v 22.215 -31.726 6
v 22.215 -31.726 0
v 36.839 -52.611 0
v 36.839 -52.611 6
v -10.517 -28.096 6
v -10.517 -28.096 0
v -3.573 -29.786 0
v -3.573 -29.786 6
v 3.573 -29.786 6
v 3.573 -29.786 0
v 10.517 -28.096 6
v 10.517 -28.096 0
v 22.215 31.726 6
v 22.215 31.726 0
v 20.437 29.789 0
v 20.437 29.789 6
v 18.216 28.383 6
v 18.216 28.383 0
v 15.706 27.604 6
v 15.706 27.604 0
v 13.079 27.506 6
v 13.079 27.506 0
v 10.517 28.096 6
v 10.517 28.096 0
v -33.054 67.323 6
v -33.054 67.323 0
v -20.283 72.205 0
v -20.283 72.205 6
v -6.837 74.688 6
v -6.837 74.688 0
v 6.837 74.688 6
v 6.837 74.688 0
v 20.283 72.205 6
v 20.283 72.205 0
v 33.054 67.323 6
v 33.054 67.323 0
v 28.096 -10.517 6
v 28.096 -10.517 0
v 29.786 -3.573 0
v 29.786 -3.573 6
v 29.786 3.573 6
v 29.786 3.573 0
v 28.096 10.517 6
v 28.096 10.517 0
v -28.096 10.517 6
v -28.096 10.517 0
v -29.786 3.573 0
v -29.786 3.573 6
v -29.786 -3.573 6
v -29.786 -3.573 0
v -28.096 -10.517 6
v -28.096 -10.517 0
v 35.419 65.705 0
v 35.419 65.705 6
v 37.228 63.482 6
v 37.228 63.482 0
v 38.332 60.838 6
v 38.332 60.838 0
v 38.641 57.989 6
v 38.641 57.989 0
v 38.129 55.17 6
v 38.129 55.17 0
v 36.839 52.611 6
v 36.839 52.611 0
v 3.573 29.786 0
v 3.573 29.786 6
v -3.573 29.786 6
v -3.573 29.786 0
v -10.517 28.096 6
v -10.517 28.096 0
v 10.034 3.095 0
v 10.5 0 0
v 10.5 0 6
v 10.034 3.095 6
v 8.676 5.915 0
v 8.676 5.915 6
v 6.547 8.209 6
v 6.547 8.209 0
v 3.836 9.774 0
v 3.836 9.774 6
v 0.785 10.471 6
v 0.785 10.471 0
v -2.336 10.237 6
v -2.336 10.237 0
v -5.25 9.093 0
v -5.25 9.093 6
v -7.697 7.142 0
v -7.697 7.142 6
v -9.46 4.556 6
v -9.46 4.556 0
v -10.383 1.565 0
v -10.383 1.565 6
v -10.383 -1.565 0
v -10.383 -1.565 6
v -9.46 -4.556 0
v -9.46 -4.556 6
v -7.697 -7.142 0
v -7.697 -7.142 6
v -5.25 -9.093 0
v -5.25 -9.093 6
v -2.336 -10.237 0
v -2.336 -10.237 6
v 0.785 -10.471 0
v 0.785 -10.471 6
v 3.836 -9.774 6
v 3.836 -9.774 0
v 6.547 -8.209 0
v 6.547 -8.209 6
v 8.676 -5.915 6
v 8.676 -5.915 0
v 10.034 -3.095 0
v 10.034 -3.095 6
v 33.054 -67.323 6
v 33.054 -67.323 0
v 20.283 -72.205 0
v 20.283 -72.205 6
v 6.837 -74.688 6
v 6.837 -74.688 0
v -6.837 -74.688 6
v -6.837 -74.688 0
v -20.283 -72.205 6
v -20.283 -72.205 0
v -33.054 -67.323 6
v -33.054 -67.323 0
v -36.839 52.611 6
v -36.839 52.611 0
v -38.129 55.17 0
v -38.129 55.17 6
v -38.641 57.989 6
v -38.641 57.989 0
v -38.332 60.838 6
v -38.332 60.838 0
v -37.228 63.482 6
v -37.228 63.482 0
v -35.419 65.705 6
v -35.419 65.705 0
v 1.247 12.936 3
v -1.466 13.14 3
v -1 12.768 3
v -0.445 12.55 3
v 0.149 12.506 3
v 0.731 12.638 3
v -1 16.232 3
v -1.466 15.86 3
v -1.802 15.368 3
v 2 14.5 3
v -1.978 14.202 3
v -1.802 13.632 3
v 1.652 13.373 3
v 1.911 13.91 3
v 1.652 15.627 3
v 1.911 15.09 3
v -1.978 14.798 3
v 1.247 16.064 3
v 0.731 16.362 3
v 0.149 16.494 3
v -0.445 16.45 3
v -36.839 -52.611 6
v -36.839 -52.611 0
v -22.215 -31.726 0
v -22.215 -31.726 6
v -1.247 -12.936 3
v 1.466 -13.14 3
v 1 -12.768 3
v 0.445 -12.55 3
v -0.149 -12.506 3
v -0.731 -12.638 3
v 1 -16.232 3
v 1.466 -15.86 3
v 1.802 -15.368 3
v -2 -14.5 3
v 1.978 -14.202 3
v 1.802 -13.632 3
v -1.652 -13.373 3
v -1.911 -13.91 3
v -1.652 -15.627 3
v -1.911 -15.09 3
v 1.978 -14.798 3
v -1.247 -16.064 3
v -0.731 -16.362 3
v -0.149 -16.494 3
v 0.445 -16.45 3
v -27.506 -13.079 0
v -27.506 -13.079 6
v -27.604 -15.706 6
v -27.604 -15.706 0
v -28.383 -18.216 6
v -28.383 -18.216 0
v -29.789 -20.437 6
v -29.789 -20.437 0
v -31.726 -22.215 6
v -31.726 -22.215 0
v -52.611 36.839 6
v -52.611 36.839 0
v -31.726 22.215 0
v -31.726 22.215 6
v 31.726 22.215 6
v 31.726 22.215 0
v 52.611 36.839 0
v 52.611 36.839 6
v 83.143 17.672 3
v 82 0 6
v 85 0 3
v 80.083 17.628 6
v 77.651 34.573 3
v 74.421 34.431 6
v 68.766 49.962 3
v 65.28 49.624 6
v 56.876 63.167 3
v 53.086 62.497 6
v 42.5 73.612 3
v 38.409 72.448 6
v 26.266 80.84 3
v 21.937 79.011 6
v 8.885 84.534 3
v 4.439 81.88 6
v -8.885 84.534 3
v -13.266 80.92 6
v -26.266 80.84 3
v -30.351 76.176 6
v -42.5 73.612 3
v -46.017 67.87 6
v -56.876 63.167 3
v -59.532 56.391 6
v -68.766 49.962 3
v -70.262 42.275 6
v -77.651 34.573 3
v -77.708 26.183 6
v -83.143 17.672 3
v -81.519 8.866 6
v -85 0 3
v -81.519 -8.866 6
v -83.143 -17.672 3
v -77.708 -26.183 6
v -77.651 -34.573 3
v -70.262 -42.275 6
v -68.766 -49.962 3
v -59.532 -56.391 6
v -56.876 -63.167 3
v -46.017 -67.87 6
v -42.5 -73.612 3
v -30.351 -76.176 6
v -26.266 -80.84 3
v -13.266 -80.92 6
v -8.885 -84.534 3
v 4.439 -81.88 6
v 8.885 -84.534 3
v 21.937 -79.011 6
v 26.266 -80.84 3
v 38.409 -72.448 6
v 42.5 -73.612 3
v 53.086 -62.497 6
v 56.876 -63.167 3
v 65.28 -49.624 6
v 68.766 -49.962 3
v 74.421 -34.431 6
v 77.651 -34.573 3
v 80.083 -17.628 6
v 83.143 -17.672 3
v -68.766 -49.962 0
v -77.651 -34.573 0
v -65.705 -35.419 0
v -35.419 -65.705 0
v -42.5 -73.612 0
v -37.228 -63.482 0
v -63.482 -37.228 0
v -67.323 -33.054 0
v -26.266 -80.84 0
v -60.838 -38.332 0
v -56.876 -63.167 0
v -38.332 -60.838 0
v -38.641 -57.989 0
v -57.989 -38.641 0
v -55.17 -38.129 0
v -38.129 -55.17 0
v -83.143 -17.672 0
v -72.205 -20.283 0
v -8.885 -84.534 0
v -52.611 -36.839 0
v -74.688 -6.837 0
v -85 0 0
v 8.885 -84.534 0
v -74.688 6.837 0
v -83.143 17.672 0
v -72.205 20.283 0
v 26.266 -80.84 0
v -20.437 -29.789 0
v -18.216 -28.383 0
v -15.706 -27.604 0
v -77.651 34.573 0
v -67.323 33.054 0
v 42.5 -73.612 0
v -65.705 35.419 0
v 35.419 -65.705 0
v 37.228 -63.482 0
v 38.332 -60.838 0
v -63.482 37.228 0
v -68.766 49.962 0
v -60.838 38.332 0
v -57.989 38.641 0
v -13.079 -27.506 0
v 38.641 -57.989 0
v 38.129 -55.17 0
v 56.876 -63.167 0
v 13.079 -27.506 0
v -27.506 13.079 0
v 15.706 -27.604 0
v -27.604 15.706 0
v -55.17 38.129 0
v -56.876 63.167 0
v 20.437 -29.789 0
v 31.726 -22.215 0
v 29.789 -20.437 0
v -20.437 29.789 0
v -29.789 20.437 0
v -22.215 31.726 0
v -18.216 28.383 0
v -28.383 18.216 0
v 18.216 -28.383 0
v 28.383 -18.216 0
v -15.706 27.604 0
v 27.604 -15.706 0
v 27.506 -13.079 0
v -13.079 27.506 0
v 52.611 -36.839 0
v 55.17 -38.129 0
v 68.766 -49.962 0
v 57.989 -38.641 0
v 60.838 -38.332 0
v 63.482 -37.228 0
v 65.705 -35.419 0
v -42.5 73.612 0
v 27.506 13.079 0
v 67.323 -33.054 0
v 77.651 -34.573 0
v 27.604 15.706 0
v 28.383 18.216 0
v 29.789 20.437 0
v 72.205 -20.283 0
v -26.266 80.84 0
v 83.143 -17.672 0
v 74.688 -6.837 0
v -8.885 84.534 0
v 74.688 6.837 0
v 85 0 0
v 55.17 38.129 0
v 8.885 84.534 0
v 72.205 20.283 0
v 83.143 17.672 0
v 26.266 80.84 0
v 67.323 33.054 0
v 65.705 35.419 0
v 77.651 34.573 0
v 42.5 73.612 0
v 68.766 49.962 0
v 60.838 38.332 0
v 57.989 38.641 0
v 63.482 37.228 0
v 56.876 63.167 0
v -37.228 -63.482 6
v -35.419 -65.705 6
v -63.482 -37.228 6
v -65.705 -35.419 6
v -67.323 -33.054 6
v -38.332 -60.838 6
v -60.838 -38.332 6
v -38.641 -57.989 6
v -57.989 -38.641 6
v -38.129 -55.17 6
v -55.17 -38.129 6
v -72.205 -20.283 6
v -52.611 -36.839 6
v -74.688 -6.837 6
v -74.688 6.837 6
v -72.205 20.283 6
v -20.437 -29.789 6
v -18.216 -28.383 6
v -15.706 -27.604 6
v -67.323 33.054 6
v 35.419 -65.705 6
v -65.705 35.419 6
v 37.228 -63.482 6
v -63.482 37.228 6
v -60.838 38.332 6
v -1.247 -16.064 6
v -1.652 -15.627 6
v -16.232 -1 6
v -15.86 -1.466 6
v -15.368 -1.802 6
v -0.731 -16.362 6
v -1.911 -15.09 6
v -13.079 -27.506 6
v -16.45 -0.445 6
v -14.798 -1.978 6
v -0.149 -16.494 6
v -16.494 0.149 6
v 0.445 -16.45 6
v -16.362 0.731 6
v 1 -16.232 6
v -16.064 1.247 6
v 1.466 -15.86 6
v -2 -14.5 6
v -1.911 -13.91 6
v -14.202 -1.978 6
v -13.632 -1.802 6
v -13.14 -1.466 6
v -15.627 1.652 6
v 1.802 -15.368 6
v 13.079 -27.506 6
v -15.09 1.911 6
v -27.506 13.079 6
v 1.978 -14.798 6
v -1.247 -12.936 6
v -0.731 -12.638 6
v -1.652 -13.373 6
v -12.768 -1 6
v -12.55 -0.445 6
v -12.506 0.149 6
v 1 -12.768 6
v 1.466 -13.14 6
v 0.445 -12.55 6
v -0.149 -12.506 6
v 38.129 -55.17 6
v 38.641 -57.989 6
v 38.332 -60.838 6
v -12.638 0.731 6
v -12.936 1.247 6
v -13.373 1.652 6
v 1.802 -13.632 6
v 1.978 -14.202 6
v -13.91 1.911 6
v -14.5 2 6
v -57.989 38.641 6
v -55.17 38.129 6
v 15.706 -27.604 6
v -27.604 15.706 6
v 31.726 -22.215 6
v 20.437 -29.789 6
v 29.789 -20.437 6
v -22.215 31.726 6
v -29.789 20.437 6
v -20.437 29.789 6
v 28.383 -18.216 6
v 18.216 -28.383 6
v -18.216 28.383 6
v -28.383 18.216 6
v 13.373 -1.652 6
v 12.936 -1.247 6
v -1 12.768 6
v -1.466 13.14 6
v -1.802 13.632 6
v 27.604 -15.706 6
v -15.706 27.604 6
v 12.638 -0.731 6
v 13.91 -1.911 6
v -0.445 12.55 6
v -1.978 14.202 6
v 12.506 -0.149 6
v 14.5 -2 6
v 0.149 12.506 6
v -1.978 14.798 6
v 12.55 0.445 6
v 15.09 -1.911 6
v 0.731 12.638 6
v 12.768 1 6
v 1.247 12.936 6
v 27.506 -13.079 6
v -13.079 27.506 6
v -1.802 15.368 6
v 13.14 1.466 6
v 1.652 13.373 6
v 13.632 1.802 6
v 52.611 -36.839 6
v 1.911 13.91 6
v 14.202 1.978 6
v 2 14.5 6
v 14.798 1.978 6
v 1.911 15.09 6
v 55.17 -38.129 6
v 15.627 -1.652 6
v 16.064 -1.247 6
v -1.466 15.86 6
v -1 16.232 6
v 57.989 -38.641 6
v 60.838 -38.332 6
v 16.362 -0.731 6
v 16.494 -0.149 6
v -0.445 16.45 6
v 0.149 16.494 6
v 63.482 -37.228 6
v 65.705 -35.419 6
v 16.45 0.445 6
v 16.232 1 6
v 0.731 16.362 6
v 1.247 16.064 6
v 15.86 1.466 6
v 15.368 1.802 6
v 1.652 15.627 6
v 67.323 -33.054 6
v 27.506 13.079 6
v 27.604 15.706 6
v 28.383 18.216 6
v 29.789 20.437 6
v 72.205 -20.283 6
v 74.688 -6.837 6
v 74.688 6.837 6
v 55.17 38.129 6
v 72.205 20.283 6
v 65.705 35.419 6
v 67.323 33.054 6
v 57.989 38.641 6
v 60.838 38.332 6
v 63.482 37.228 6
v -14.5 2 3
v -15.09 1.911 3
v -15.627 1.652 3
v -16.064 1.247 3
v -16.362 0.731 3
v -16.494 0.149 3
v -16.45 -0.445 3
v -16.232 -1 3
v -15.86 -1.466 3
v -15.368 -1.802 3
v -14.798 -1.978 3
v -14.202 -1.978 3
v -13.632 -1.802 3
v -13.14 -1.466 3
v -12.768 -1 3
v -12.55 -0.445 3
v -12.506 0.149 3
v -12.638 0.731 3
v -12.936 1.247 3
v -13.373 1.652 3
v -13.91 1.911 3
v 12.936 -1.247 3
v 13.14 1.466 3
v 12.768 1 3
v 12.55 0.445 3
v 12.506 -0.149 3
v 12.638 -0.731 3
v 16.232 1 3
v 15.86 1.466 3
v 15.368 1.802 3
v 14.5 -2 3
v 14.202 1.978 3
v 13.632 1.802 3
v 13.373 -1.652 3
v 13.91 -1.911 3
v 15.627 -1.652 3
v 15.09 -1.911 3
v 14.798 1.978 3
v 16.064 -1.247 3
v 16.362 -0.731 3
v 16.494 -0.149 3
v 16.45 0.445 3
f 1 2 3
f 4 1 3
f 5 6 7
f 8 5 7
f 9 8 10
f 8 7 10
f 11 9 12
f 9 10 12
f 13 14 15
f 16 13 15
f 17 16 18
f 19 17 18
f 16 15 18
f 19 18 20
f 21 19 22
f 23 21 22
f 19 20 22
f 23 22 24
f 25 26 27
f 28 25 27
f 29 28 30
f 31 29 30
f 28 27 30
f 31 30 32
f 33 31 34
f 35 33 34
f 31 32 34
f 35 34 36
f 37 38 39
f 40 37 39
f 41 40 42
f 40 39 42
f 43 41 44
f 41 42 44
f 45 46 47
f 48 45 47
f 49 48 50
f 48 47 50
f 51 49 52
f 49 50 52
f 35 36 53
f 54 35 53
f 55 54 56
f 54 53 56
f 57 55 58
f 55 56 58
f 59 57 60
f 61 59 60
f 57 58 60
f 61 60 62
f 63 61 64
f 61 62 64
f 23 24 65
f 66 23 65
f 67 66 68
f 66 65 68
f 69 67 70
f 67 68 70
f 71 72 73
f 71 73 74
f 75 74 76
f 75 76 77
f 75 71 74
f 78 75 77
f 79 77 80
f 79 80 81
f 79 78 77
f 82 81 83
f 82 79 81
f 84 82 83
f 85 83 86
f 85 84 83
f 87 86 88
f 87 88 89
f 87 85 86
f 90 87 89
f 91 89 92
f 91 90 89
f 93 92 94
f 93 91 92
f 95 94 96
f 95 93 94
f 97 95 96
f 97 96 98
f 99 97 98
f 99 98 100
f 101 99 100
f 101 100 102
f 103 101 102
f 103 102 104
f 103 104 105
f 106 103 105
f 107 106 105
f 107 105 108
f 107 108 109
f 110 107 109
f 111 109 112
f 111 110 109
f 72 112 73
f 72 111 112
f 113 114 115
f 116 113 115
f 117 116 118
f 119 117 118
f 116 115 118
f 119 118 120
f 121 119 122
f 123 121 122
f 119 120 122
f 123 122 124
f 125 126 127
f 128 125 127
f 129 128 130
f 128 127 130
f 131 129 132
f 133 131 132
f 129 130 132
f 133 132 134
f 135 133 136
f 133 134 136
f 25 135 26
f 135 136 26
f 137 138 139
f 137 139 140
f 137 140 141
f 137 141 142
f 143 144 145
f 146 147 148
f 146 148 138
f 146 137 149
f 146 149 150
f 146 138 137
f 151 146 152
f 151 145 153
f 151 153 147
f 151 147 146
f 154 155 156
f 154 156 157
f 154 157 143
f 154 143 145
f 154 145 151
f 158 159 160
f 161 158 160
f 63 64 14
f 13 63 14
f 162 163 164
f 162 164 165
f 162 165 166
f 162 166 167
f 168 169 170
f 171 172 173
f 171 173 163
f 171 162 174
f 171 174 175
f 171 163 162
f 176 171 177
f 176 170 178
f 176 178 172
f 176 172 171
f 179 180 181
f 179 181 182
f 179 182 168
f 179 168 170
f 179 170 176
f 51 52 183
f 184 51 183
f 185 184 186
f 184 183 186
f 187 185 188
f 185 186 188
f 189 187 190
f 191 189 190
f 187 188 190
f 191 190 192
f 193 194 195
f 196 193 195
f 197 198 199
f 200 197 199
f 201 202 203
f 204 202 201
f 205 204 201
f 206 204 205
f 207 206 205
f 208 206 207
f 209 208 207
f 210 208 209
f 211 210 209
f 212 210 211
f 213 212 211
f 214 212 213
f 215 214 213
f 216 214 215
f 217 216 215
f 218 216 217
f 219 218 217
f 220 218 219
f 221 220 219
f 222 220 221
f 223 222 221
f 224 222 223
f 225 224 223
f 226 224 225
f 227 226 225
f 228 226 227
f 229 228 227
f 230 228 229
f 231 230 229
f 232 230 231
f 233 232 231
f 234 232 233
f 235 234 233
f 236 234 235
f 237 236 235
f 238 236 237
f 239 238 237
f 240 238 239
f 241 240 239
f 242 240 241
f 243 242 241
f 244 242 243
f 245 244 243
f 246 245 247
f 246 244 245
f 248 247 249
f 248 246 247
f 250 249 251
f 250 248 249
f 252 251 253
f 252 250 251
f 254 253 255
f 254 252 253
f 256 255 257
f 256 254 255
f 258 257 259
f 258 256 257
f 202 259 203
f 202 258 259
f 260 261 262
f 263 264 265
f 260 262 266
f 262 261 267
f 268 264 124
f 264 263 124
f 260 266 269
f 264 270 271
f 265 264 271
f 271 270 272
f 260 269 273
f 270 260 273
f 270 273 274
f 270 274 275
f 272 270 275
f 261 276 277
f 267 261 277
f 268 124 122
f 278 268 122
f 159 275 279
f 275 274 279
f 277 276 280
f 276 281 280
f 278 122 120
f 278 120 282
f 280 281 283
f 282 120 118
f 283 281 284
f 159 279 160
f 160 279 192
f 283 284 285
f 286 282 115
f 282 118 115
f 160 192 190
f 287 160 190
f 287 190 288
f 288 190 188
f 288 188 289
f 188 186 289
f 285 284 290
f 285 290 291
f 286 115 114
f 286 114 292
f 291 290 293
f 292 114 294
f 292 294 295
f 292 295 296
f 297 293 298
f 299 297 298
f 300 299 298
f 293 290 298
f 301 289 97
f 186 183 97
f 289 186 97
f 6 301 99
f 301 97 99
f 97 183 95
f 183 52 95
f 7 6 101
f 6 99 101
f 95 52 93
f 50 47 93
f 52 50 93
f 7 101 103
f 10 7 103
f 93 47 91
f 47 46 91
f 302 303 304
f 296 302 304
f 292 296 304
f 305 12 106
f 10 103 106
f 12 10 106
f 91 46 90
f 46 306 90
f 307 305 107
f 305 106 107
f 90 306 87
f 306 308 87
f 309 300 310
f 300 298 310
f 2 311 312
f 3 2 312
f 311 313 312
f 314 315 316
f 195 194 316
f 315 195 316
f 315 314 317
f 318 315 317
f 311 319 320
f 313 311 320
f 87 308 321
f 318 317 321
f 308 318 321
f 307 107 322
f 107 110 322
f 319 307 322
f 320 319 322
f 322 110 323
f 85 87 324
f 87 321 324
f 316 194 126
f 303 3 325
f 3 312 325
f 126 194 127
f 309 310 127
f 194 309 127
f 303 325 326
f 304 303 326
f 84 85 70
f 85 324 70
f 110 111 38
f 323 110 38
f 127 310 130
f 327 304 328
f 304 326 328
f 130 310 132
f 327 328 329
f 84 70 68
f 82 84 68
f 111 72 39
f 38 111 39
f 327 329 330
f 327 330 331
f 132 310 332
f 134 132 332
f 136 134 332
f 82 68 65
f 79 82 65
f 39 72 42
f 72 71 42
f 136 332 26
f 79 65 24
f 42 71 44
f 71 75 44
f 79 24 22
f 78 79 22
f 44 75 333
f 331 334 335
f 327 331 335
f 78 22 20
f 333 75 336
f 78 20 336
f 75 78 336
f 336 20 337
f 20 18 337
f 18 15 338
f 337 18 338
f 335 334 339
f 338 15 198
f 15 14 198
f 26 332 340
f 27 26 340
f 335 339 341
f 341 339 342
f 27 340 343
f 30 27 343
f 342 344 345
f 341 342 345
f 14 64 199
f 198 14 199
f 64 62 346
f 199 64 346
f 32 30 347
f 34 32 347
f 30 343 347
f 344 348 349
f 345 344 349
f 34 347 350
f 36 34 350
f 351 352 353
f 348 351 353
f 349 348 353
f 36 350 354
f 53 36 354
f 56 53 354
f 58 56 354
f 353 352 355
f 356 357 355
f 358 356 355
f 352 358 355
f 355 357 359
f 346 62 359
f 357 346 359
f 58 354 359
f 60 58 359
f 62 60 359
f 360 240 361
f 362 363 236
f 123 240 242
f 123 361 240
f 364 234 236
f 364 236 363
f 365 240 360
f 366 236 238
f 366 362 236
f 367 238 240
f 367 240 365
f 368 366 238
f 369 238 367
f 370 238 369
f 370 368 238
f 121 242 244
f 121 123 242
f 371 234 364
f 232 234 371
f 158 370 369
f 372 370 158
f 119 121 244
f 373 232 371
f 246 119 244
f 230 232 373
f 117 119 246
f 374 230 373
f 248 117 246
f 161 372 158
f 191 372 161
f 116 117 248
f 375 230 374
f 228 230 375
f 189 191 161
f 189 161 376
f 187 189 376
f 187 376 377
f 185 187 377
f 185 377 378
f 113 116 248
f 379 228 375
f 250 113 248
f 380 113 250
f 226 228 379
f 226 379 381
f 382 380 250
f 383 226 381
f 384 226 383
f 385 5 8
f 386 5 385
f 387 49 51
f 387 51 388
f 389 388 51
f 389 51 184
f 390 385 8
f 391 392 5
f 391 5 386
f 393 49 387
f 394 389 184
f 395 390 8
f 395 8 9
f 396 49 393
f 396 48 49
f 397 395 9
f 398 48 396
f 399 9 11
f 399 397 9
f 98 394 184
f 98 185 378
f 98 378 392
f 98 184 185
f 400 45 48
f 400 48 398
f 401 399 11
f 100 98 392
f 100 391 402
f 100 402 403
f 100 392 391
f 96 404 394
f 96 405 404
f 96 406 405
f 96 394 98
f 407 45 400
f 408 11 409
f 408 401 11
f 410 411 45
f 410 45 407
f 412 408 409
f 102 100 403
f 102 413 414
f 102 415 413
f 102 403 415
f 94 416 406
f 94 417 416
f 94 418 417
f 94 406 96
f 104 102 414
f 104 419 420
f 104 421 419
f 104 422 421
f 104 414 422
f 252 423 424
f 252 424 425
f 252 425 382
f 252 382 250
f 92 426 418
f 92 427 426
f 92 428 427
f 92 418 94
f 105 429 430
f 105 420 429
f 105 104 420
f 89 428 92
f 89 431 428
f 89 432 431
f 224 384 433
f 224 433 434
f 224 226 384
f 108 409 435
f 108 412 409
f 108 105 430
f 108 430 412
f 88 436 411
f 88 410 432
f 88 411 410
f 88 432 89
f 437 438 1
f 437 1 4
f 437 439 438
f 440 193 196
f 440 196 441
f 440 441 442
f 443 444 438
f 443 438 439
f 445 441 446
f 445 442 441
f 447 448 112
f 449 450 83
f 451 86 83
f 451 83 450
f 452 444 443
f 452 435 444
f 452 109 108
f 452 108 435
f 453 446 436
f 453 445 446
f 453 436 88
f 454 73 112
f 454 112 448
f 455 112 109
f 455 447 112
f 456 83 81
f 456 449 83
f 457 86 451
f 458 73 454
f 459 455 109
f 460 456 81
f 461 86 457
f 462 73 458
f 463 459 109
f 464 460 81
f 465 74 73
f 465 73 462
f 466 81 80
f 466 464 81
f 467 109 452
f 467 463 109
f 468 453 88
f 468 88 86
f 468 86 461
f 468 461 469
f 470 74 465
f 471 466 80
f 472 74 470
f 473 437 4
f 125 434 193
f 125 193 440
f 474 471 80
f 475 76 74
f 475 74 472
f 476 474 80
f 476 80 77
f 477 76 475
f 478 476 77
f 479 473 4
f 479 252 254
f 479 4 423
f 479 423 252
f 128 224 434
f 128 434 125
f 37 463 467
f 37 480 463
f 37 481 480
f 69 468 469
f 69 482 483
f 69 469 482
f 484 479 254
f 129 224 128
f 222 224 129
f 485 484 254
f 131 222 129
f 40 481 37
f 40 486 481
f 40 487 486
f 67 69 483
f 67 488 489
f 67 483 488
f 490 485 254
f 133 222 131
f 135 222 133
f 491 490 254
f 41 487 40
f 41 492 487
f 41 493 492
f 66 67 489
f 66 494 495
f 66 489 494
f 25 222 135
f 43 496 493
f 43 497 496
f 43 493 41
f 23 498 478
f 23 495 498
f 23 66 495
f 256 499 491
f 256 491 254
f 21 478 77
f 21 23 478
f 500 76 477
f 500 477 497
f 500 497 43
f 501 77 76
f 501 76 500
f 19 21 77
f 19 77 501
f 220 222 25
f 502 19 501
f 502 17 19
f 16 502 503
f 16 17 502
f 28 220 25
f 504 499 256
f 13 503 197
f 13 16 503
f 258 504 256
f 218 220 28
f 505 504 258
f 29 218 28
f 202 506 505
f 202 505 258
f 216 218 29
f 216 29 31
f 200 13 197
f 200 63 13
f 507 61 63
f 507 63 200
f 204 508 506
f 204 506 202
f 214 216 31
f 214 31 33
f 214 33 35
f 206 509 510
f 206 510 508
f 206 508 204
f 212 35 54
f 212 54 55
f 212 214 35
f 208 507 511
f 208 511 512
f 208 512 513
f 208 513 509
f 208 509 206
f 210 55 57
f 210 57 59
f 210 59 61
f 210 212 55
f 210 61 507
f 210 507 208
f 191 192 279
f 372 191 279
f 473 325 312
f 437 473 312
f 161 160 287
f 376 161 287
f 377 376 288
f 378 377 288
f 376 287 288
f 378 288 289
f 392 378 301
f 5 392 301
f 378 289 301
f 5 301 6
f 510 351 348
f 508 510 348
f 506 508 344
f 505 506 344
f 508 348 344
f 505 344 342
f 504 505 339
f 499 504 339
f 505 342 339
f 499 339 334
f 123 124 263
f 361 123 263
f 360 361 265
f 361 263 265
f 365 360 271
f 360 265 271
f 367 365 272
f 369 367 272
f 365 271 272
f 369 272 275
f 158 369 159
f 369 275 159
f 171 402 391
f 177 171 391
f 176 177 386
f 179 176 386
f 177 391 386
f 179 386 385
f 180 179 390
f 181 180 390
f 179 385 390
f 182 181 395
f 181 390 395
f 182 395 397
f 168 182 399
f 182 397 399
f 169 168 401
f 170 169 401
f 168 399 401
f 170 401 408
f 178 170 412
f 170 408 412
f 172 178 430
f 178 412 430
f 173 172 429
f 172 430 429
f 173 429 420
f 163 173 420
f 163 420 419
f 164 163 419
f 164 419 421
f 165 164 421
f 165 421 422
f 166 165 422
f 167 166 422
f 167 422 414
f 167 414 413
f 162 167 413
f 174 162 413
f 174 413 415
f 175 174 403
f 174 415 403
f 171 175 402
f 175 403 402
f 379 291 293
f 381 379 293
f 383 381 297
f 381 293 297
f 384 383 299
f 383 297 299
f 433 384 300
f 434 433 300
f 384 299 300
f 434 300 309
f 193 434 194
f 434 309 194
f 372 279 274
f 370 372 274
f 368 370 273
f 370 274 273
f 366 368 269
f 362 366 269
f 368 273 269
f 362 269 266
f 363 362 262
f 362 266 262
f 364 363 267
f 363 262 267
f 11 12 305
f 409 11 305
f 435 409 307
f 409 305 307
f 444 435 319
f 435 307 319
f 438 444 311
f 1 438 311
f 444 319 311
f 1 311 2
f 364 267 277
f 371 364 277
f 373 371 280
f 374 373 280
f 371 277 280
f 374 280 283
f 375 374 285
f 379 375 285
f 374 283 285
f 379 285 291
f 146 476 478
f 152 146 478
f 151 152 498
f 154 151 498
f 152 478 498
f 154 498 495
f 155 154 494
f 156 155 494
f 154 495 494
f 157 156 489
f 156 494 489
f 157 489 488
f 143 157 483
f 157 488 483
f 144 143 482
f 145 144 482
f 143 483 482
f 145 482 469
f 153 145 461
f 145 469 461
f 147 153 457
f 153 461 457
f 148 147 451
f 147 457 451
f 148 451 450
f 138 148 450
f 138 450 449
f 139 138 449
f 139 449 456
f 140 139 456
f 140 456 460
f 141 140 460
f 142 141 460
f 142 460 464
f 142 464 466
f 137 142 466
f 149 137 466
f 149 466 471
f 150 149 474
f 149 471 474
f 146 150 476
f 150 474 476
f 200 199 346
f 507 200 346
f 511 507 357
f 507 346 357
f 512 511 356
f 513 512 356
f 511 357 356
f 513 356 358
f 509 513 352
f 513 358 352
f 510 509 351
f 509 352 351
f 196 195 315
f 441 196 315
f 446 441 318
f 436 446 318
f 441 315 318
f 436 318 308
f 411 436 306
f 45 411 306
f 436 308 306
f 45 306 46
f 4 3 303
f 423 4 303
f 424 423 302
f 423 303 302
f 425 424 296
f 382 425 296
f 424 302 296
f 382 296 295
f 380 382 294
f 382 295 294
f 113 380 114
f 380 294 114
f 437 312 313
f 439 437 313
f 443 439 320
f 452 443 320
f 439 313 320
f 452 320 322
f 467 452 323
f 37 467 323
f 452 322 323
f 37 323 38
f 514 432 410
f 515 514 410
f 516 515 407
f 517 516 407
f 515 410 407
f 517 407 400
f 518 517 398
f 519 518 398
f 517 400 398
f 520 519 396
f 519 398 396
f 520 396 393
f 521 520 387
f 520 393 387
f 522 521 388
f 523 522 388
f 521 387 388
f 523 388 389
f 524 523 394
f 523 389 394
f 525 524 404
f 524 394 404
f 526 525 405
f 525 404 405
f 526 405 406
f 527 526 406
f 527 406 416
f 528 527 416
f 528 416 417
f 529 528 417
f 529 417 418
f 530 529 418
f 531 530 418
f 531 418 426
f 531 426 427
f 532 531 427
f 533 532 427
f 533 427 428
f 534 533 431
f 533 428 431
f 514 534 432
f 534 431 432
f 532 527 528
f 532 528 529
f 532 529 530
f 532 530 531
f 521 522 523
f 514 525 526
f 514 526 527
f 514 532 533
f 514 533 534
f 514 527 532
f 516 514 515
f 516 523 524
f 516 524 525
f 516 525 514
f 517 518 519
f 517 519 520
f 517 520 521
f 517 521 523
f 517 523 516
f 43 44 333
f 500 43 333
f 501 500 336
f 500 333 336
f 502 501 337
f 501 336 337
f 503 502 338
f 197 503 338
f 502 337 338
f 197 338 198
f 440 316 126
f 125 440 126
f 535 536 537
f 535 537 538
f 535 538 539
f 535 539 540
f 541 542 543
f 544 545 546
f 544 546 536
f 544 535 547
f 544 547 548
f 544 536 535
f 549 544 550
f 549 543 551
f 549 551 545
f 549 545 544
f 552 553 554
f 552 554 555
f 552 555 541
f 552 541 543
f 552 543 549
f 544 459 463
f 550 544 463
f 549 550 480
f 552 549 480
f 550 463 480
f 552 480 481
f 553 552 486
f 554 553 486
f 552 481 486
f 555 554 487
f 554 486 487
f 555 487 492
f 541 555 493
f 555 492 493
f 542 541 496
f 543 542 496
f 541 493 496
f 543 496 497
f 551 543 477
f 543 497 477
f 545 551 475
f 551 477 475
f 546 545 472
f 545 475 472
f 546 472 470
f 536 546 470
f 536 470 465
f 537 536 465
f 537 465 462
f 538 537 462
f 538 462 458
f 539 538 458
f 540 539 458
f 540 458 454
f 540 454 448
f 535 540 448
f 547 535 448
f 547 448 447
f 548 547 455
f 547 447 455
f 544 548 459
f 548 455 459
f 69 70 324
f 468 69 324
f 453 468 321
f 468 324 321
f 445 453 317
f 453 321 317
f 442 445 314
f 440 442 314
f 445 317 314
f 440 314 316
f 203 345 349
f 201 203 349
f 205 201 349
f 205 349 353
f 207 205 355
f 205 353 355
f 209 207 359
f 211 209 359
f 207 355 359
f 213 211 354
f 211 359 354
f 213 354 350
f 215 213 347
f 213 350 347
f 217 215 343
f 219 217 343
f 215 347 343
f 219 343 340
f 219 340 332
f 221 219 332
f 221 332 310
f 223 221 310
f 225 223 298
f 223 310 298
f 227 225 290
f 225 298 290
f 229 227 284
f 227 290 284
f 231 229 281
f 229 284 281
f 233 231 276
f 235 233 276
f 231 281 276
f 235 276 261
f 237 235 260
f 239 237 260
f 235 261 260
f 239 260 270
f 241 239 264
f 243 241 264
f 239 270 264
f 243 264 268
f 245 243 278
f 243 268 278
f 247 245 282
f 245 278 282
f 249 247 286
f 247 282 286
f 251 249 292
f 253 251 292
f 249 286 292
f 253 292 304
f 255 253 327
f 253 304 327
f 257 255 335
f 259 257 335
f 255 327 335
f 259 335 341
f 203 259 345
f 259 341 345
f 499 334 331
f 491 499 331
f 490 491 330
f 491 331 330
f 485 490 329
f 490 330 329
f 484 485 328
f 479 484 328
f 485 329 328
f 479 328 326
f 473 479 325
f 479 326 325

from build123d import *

# Parameters (mm, degrees)
SKETCH_1_R               = 85
SKETCH_1_R_2             = 10.5
EXTRUDE_1_DEPTH          = 6
SKETCH_2_R               = 2
CUT_EXTRUDE_1_DEPTH      = 3
PATTERN_CIRCULAR_2_COUNT = 4
CHAMFER_1_SIZE           = 3


with BuildPart() as part:
    # 草图1 → 凸台-拉伸1 (new body)
    with BuildSketch(Plane.XY):
        Circle(SKETCH_1_R)
        with BuildLine():
            Line((-31.725622255, -22.214519858), (-52.610992631, -36.838613633))
            ThreePointArc((-52.610992631, -36.838613633), (-60.837871991, -38.331841306), (-67.323181147, -33.054338296))
            ThreePointArc((-67.323181147, -33.054338296), (-75, 0), (-67.323181147, 33.054338296))
            ThreePointArc((-67.323181147, 33.054338296), (-60.837871991, 38.331841306), (-52.610992631, 36.838613633))
            Line((-52.610992631, 36.838613633), (-31.725622255, 22.214519858))
            ThreePointArc((-31.725622255, 22.214519858), (-27.910605416, 16.986540946), (-28.096039964, 10.517249561))
            ThreePointArc((-28.096039964, 10.517249561), (-30, 0), (-28.096039964, -10.517249561))
            ThreePointArc((-28.096039964, -10.517249561), (-27.910605416, -16.986540946), (-31.725622255, -22.214519858))
        make_face(mode=Mode.SUBTRACT)
        with BuildLine():
            Line((22.214519858, -31.725622255), (36.838613633, -52.610992631))
            ThreePointArc((36.838613633, -52.610992631), (38.331841306, -60.837871991), (33.054338296, -67.323181147))
            ThreePointArc((33.054338296, -67.323181147), (0, -75), (-33.054338296, -67.323181147))
            ThreePointArc((-33.054338296, -67.323181147), (-38.331841306, -60.837871991), (-36.838613633, -52.610992631))
            Line((-36.838613633, -52.610992631), (-22.214519858, -31.725622255))
            ThreePointArc((-22.214519858, -31.725622255), (-16.986540946, -27.910605416), (-10.517249561, -28.096039964))
            ThreePointArc((-10.517249561, -28.096039964), (0, -30), (10.517249561, -28.096039964))
            ThreePointArc((10.517249561, -28.096039964), (16.986540946, -27.910605416), (22.214519858, -31.725622255))
        make_face(mode=Mode.SUBTRACT)
        with BuildLine():
            Line((36.838613633, 52.610992631), (22.214519858, 31.725622255))
            ThreePointArc((22.214519858, 31.725622255), (16.986540946, 27.910605416), (10.517249561, 28.096039964))
            ThreePointArc((10.517249561, 28.096039964), (0, 30), (-10.517249561, 28.096039964))
            ThreePointArc((-10.517249561, 28.096039964), (-16.986540946, 27.910605416), (-22.214519858, 31.725622255))
            Line((-22.214519858, 31.725622255), (-36.838613633, 52.610992631))
            ThreePointArc((-36.838613633, 52.610992631), (-38.331841306, 60.837871991), (-33.054338296, 67.323181147))
            ThreePointArc((-33.054338296, 67.323181147), (0, 75), (33.054338296, 67.323181147))
            ThreePointArc((33.054338296, 67.323181147), (38.331841306, 60.837871991), (36.838613633, 52.610992631))
        make_face(mode=Mode.SUBTRACT)
        with BuildLine():
            Line((31.725622255, 22.214519858), (52.610992631, 36.838613633))
            ThreePointArc((52.610992631, 36.838613633), (60.837871991, 38.331841306), (67.323181147, 33.054338296))
            ThreePointArc((67.323181147, 33.054338296), (75, 0), (67.323181147, -33.054338296))
            ThreePointArc((67.323181147, -33.054338296), (60.837871991, -38.331841306), (52.610992631, -36.838613633))
            Line((52.610992631, -36.838613633), (31.725622255, -22.214519858))
            ThreePointArc((31.725622255, -22.214519858), (27.910605416, -16.986540946), (28.096039964, -10.517249561))
            ThreePointArc((28.096039964, -10.517249561), (30, 0), (28.096039964, 10.517249561))
            ThreePointArc((28.096039964, 10.517249561), (27.910605416, 16.986540946), (31.725622255, 22.214519858))
        make_face(mode=Mode.SUBTRACT)
        Circle(SKETCH_1_R_2, mode=Mode.SUBTRACT)
    extrude(amount=EXTRUDE_1_DEPTH)

    # 草图2 → 切除-拉伸1 (cut)
    with BuildSketch(Plane.XY.offset(6)):
        with Locations((0, 14.5)):
            Circle(SKETCH_2_R)
    cut_extrude_1 = extrude(amount=-CUT_EXTRUDE_1_DEPTH, mode=Mode.SUBTRACT)

    # 阵列(圆周)2: 切除-拉伸1 ×4 about axis
    pattern_circular_2_axis = Axis((0, 0, 0), (0, 0, 1))
    for i in range(1, PATTERN_CIRCULAR_2_COUNT):
        add(cut_extrude_1.rotate(pattern_circular_2_axis, i * 360 / PATTERN_CIRCULAR_2_COUNT), mode=Mode.SUBTRACT)

    # 倒角1
    chamfer_1_edges = [part.edges().sort_by_distance(p)[0] for p in [
        (-85, 0, 6),
    ]]
    chamfer(chamfer_1_edges, length=CHAMFER_1_SIZE)


solid = part.part
